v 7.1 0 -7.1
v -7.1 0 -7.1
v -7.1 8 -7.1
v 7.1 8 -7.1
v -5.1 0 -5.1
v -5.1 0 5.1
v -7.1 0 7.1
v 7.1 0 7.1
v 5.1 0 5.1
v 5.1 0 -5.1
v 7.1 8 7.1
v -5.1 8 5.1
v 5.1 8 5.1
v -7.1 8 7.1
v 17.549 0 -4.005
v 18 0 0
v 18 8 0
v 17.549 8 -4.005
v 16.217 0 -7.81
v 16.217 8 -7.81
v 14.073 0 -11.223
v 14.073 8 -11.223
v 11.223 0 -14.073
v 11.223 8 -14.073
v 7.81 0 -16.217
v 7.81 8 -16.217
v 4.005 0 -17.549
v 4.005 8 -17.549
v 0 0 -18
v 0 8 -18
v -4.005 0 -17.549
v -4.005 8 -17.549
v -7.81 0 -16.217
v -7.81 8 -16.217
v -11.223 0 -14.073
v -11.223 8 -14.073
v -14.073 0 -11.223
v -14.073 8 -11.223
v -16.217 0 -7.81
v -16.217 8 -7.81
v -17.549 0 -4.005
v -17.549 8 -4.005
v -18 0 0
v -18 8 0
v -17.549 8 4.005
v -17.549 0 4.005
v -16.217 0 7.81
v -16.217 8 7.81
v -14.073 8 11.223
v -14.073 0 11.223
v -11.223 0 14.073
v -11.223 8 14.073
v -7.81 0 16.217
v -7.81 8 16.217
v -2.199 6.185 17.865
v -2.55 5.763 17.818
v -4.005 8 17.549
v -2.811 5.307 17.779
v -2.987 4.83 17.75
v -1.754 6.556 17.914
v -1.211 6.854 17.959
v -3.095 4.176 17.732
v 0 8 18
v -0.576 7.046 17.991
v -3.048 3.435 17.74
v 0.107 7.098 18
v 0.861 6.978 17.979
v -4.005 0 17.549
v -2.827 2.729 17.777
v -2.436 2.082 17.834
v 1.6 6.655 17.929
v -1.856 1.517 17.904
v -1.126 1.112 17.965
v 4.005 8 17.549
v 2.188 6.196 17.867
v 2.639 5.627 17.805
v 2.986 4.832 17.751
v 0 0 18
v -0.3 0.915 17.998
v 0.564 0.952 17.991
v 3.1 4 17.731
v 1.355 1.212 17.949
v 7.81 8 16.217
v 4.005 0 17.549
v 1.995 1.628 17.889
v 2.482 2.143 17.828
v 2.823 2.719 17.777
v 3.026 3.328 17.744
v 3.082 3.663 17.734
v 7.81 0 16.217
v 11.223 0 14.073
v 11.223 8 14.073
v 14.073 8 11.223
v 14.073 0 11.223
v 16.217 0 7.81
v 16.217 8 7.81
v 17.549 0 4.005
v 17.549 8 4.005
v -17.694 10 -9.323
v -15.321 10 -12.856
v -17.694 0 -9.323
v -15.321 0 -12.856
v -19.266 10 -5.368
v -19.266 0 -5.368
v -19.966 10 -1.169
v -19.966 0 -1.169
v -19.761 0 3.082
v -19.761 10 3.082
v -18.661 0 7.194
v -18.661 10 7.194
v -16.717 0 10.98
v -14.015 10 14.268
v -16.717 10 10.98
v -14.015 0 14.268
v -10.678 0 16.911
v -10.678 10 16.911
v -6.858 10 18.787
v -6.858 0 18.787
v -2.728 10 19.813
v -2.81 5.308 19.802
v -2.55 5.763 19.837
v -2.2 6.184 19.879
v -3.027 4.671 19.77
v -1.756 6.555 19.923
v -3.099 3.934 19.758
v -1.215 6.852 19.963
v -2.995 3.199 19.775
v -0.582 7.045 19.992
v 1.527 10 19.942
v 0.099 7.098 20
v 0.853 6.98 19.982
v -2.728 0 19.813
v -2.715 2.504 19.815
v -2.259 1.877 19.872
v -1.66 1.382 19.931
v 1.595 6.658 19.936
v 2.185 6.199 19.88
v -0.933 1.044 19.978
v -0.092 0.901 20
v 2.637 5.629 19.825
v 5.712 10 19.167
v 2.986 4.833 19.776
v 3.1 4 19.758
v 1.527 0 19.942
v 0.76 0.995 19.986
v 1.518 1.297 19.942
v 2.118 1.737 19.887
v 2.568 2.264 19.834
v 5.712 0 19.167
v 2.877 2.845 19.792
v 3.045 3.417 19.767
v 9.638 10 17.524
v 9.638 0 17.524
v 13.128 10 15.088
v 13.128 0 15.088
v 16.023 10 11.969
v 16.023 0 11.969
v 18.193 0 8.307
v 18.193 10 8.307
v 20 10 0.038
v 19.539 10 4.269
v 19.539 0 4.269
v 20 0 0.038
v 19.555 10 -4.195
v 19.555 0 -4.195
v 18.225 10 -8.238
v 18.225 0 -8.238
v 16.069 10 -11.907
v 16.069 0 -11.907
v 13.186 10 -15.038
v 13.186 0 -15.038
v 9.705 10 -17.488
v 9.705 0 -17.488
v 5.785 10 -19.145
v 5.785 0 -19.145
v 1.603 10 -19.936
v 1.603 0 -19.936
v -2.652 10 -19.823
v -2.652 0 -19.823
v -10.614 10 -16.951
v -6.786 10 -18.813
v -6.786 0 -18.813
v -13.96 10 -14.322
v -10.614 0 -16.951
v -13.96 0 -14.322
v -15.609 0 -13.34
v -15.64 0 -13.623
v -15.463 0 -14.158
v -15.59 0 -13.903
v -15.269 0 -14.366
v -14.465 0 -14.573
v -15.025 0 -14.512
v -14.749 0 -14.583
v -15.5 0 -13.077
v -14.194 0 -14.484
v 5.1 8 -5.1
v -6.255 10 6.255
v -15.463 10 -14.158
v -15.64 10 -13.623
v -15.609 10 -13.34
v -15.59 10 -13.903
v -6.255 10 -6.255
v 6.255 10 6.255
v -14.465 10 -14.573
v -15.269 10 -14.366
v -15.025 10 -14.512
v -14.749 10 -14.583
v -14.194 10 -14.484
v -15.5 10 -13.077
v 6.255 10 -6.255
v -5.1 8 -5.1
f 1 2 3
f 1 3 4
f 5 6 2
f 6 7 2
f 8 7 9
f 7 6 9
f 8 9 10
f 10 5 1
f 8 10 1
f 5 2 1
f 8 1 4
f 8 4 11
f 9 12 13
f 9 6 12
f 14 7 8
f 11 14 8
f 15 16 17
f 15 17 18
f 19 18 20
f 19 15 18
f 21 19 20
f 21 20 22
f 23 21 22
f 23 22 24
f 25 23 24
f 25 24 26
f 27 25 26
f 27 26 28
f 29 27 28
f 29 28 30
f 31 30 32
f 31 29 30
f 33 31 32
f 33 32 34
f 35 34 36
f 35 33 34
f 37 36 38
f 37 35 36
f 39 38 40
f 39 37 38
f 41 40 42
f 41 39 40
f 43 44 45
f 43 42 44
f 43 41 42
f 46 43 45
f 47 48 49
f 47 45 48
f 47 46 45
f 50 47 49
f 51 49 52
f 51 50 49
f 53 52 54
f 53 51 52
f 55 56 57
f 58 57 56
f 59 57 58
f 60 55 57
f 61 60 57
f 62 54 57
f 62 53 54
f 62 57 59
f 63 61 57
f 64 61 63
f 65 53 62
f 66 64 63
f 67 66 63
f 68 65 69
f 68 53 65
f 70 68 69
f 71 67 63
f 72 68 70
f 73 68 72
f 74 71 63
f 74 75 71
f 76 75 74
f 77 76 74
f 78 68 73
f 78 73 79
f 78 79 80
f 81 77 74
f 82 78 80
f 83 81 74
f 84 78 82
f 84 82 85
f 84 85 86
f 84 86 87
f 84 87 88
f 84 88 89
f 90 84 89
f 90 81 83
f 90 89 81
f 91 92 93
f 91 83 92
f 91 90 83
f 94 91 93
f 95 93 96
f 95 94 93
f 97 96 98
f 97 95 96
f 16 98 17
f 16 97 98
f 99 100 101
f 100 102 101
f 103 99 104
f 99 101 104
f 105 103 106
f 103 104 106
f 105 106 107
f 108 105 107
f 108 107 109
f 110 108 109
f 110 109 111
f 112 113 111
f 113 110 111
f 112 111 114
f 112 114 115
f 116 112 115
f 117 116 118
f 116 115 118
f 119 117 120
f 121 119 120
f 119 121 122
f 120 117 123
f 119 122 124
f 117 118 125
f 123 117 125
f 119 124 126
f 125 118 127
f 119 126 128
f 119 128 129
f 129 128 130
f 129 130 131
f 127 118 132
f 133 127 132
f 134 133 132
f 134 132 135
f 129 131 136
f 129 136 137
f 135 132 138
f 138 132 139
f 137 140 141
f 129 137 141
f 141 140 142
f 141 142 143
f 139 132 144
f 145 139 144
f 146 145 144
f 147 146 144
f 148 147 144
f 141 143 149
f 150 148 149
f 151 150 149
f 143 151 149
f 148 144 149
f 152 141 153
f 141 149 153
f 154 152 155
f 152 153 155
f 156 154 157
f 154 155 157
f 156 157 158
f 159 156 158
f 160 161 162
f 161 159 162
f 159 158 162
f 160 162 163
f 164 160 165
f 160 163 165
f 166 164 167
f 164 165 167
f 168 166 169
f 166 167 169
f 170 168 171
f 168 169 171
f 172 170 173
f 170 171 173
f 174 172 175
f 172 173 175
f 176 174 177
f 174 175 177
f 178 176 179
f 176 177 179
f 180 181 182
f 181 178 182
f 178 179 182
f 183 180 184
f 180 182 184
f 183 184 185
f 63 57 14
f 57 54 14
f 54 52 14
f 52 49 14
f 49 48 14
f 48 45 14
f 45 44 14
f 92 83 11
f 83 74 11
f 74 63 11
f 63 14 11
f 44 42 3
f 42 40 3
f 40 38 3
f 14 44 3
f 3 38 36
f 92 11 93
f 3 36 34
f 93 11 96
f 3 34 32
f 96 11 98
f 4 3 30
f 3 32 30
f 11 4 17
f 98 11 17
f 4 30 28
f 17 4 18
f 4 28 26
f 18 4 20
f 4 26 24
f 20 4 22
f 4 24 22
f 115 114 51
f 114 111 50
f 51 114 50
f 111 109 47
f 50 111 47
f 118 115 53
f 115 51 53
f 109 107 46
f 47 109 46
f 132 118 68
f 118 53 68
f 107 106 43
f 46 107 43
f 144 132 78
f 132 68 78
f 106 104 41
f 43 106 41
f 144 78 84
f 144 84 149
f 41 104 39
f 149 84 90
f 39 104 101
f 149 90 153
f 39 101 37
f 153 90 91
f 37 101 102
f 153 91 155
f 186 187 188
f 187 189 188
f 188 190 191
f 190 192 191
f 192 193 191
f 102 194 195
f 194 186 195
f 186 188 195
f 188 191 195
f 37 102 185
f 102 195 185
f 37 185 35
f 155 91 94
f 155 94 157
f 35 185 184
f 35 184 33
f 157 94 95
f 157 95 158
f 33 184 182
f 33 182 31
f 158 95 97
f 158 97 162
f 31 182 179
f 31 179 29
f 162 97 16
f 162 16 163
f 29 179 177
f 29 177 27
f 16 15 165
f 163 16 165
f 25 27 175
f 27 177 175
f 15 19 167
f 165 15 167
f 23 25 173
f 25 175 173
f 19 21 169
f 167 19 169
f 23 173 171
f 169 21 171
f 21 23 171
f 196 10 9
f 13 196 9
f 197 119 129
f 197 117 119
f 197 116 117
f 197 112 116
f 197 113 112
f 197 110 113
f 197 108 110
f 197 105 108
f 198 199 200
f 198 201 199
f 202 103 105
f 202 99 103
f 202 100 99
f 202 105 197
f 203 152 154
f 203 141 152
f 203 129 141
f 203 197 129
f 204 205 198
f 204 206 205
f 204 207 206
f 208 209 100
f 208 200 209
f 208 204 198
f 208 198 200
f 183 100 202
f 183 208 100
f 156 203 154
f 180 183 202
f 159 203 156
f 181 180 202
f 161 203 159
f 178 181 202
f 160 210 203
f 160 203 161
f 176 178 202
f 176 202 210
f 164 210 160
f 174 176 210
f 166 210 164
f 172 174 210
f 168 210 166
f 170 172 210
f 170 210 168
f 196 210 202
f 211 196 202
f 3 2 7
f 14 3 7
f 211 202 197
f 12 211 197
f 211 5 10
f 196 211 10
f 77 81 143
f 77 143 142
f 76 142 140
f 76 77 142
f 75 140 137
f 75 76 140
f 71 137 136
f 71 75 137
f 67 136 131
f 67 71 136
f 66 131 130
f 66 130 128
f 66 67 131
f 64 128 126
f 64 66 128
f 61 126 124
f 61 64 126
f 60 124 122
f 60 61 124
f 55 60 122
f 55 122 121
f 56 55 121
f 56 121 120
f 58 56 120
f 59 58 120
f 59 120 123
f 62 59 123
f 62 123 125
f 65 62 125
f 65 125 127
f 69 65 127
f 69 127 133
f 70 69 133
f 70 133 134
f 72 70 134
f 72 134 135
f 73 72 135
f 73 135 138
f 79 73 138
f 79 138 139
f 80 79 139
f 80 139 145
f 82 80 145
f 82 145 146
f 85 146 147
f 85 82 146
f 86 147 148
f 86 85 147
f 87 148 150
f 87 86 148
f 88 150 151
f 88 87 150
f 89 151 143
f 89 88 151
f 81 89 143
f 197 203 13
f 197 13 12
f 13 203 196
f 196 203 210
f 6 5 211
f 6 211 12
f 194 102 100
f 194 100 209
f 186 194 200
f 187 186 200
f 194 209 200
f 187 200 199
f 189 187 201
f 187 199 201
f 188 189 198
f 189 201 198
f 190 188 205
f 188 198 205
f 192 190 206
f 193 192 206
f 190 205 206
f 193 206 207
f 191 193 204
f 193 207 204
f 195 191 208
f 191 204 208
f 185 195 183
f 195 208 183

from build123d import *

# Parameters (mm, degrees)
SKETCH1_R             = 20
BOSS_EXTRUDE1_DEPTH   = 10
SKETCH2_W             = 10.2
SKETCH2_H             = 10.2
CUT_EXTRUDE2_DEPTH    = 11
SHELL3_T              = -2
SKETCH3_R             = 3.1
CUT_EXTRUDE3_DEPTH    = 13.9
BOSS_EXTRUDE2_DEPTH   = 10
CHAMFER1_SIZE         = 2
CHAMFER1_SIZE2        = 1.154700538
CHAMFER1_PART_2_SIZE  = 2
CHAMFER1_PART_2_SIZE2 = 1.154700538
CHAMFER1_PART_3_SIZE  = 2
CHAMFER1_PART_3_SIZE2 = 1.154700538
CHAMFER1_PART_4_SIZE  = 2
CHAMFER1_PART_4_SIZE2 = 1.154700538


with BuildPart() as part:
    # Sketch1 → Boss-Extrude1 (new body)
    with BuildSketch(Plane(origin=(0, 0, 0), x_dir=(1, 0, 0), z_dir=(0, 1, 0))):
        Circle(SKETCH1_R)
    extrude(amount=BOSS_EXTRUDE1_DEPTH)

    # Sketch2 → Cut-Extrude2 (cut, through all)
    with BuildSketch(Plane.XZ):
        Rectangle(SKETCH2_W, SKETCH2_H)
    extrude(amount=-CUT_EXTRUDE2_DEPTH, mode=Mode.SUBTRACT)

    # Shell3
    shell3_openings = [part.faces().sort_by_distance(p)[0] for p in [
        (0, 0, 0),
    ]]
    offset(amount=SHELL3_T, openings=shell3_openings, kind=Kind.INTERSECTION)

    # Sketch3 → Cut-Extrude3 (cut, through all)
    with BuildSketch(Plane.XY.offset(7.1)):
        with Locations((0, 4)):
            Circle(SKETCH3_R)
    extrude(amount=CUT_EXTRUDE3_DEPTH, mode=Mode.SUBTRACT)

    # Sketch4 → Boss-Extrude2 (add)
    with BuildSketch(Plane(origin=(0, 10, 0), x_dir=(1, 0, 0), z_dir=(0, 1, 0))):
        with BuildLine():
            Line((-13.960317173, 14.321646009), (-15.320888862, 12.855752194))
            ThreePointArc((-15.320888862, 12.855752194), (-15.373549926, 14.268984946), (-13.960317173, 14.321646009))
        make_face()
    extrude(amount=-BOSS_EXTRUDE2_DEPTH)

    # Chamfer1
    chamfer1_edges = [part.edges().sort_by_distance(p)[0] for p in [
        (5.1, 10, 0),
    ]]
    chamfer1_side = [part.faces().sort_by_distance(p)[0] for p in [
        (5.1, 5, 0),
    ]]
    chamfer(chamfer1_edges, length=CHAMFER1_SIZE, length2=CHAMFER1_SIZE2, reference=chamfer1_side[0])

    # Chamfer1 part 2
    chamfer1_part_2_edges = [part.edges().sort_by_distance(p)[0] for p in [
        (0, 10, -5.1),
    ]]
    chamfer1_part_2_side = [part.faces().sort_by_distance(p)[0] for p in [
        (0, 5, -5.1),
    ]]
    chamfer(chamfer1_part_2_edges, length=CHAMFER1_PART_2_SIZE, length2=CHAMFER1_PART_2_SIZE2, reference=chamfer1_part_2_side[0])

    # Chamfer1 part 3
    chamfer1_part_3_edges = [part.edges().sort_by_distance(p)[0] for p in [
        (-5.1, 10, 0),
    ]]
    chamfer1_part_3_side = [part.faces().sort_by_distance(p)[0] for p in [
        (-5.1, 5, 0),
    ]]
    chamfer(chamfer1_part_3_edges, length=CHAMFER1_PART_3_SIZE, length2=CHAMFER1_PART_3_SIZE2, reference=chamfer1_part_3_side[0])

    # Chamfer1 part 4
    chamfer1_part_4_edges = [part.edges().sort_by_distance(p)[0] for p in [
        (0, 10, 5.1),
    ]]
    chamfer1_part_4_side = [part.faces().sort_by_distance(p)[0] for p in [
        (0, 5, 5.1),
    ]]
    chamfer(chamfer1_part_4_edges, length=CHAMFER1_PART_4_SIZE, length2=CHAMFER1_PART_4_SIZE2, reference=chamfer1_part_4_side[0])


solid = part.part
